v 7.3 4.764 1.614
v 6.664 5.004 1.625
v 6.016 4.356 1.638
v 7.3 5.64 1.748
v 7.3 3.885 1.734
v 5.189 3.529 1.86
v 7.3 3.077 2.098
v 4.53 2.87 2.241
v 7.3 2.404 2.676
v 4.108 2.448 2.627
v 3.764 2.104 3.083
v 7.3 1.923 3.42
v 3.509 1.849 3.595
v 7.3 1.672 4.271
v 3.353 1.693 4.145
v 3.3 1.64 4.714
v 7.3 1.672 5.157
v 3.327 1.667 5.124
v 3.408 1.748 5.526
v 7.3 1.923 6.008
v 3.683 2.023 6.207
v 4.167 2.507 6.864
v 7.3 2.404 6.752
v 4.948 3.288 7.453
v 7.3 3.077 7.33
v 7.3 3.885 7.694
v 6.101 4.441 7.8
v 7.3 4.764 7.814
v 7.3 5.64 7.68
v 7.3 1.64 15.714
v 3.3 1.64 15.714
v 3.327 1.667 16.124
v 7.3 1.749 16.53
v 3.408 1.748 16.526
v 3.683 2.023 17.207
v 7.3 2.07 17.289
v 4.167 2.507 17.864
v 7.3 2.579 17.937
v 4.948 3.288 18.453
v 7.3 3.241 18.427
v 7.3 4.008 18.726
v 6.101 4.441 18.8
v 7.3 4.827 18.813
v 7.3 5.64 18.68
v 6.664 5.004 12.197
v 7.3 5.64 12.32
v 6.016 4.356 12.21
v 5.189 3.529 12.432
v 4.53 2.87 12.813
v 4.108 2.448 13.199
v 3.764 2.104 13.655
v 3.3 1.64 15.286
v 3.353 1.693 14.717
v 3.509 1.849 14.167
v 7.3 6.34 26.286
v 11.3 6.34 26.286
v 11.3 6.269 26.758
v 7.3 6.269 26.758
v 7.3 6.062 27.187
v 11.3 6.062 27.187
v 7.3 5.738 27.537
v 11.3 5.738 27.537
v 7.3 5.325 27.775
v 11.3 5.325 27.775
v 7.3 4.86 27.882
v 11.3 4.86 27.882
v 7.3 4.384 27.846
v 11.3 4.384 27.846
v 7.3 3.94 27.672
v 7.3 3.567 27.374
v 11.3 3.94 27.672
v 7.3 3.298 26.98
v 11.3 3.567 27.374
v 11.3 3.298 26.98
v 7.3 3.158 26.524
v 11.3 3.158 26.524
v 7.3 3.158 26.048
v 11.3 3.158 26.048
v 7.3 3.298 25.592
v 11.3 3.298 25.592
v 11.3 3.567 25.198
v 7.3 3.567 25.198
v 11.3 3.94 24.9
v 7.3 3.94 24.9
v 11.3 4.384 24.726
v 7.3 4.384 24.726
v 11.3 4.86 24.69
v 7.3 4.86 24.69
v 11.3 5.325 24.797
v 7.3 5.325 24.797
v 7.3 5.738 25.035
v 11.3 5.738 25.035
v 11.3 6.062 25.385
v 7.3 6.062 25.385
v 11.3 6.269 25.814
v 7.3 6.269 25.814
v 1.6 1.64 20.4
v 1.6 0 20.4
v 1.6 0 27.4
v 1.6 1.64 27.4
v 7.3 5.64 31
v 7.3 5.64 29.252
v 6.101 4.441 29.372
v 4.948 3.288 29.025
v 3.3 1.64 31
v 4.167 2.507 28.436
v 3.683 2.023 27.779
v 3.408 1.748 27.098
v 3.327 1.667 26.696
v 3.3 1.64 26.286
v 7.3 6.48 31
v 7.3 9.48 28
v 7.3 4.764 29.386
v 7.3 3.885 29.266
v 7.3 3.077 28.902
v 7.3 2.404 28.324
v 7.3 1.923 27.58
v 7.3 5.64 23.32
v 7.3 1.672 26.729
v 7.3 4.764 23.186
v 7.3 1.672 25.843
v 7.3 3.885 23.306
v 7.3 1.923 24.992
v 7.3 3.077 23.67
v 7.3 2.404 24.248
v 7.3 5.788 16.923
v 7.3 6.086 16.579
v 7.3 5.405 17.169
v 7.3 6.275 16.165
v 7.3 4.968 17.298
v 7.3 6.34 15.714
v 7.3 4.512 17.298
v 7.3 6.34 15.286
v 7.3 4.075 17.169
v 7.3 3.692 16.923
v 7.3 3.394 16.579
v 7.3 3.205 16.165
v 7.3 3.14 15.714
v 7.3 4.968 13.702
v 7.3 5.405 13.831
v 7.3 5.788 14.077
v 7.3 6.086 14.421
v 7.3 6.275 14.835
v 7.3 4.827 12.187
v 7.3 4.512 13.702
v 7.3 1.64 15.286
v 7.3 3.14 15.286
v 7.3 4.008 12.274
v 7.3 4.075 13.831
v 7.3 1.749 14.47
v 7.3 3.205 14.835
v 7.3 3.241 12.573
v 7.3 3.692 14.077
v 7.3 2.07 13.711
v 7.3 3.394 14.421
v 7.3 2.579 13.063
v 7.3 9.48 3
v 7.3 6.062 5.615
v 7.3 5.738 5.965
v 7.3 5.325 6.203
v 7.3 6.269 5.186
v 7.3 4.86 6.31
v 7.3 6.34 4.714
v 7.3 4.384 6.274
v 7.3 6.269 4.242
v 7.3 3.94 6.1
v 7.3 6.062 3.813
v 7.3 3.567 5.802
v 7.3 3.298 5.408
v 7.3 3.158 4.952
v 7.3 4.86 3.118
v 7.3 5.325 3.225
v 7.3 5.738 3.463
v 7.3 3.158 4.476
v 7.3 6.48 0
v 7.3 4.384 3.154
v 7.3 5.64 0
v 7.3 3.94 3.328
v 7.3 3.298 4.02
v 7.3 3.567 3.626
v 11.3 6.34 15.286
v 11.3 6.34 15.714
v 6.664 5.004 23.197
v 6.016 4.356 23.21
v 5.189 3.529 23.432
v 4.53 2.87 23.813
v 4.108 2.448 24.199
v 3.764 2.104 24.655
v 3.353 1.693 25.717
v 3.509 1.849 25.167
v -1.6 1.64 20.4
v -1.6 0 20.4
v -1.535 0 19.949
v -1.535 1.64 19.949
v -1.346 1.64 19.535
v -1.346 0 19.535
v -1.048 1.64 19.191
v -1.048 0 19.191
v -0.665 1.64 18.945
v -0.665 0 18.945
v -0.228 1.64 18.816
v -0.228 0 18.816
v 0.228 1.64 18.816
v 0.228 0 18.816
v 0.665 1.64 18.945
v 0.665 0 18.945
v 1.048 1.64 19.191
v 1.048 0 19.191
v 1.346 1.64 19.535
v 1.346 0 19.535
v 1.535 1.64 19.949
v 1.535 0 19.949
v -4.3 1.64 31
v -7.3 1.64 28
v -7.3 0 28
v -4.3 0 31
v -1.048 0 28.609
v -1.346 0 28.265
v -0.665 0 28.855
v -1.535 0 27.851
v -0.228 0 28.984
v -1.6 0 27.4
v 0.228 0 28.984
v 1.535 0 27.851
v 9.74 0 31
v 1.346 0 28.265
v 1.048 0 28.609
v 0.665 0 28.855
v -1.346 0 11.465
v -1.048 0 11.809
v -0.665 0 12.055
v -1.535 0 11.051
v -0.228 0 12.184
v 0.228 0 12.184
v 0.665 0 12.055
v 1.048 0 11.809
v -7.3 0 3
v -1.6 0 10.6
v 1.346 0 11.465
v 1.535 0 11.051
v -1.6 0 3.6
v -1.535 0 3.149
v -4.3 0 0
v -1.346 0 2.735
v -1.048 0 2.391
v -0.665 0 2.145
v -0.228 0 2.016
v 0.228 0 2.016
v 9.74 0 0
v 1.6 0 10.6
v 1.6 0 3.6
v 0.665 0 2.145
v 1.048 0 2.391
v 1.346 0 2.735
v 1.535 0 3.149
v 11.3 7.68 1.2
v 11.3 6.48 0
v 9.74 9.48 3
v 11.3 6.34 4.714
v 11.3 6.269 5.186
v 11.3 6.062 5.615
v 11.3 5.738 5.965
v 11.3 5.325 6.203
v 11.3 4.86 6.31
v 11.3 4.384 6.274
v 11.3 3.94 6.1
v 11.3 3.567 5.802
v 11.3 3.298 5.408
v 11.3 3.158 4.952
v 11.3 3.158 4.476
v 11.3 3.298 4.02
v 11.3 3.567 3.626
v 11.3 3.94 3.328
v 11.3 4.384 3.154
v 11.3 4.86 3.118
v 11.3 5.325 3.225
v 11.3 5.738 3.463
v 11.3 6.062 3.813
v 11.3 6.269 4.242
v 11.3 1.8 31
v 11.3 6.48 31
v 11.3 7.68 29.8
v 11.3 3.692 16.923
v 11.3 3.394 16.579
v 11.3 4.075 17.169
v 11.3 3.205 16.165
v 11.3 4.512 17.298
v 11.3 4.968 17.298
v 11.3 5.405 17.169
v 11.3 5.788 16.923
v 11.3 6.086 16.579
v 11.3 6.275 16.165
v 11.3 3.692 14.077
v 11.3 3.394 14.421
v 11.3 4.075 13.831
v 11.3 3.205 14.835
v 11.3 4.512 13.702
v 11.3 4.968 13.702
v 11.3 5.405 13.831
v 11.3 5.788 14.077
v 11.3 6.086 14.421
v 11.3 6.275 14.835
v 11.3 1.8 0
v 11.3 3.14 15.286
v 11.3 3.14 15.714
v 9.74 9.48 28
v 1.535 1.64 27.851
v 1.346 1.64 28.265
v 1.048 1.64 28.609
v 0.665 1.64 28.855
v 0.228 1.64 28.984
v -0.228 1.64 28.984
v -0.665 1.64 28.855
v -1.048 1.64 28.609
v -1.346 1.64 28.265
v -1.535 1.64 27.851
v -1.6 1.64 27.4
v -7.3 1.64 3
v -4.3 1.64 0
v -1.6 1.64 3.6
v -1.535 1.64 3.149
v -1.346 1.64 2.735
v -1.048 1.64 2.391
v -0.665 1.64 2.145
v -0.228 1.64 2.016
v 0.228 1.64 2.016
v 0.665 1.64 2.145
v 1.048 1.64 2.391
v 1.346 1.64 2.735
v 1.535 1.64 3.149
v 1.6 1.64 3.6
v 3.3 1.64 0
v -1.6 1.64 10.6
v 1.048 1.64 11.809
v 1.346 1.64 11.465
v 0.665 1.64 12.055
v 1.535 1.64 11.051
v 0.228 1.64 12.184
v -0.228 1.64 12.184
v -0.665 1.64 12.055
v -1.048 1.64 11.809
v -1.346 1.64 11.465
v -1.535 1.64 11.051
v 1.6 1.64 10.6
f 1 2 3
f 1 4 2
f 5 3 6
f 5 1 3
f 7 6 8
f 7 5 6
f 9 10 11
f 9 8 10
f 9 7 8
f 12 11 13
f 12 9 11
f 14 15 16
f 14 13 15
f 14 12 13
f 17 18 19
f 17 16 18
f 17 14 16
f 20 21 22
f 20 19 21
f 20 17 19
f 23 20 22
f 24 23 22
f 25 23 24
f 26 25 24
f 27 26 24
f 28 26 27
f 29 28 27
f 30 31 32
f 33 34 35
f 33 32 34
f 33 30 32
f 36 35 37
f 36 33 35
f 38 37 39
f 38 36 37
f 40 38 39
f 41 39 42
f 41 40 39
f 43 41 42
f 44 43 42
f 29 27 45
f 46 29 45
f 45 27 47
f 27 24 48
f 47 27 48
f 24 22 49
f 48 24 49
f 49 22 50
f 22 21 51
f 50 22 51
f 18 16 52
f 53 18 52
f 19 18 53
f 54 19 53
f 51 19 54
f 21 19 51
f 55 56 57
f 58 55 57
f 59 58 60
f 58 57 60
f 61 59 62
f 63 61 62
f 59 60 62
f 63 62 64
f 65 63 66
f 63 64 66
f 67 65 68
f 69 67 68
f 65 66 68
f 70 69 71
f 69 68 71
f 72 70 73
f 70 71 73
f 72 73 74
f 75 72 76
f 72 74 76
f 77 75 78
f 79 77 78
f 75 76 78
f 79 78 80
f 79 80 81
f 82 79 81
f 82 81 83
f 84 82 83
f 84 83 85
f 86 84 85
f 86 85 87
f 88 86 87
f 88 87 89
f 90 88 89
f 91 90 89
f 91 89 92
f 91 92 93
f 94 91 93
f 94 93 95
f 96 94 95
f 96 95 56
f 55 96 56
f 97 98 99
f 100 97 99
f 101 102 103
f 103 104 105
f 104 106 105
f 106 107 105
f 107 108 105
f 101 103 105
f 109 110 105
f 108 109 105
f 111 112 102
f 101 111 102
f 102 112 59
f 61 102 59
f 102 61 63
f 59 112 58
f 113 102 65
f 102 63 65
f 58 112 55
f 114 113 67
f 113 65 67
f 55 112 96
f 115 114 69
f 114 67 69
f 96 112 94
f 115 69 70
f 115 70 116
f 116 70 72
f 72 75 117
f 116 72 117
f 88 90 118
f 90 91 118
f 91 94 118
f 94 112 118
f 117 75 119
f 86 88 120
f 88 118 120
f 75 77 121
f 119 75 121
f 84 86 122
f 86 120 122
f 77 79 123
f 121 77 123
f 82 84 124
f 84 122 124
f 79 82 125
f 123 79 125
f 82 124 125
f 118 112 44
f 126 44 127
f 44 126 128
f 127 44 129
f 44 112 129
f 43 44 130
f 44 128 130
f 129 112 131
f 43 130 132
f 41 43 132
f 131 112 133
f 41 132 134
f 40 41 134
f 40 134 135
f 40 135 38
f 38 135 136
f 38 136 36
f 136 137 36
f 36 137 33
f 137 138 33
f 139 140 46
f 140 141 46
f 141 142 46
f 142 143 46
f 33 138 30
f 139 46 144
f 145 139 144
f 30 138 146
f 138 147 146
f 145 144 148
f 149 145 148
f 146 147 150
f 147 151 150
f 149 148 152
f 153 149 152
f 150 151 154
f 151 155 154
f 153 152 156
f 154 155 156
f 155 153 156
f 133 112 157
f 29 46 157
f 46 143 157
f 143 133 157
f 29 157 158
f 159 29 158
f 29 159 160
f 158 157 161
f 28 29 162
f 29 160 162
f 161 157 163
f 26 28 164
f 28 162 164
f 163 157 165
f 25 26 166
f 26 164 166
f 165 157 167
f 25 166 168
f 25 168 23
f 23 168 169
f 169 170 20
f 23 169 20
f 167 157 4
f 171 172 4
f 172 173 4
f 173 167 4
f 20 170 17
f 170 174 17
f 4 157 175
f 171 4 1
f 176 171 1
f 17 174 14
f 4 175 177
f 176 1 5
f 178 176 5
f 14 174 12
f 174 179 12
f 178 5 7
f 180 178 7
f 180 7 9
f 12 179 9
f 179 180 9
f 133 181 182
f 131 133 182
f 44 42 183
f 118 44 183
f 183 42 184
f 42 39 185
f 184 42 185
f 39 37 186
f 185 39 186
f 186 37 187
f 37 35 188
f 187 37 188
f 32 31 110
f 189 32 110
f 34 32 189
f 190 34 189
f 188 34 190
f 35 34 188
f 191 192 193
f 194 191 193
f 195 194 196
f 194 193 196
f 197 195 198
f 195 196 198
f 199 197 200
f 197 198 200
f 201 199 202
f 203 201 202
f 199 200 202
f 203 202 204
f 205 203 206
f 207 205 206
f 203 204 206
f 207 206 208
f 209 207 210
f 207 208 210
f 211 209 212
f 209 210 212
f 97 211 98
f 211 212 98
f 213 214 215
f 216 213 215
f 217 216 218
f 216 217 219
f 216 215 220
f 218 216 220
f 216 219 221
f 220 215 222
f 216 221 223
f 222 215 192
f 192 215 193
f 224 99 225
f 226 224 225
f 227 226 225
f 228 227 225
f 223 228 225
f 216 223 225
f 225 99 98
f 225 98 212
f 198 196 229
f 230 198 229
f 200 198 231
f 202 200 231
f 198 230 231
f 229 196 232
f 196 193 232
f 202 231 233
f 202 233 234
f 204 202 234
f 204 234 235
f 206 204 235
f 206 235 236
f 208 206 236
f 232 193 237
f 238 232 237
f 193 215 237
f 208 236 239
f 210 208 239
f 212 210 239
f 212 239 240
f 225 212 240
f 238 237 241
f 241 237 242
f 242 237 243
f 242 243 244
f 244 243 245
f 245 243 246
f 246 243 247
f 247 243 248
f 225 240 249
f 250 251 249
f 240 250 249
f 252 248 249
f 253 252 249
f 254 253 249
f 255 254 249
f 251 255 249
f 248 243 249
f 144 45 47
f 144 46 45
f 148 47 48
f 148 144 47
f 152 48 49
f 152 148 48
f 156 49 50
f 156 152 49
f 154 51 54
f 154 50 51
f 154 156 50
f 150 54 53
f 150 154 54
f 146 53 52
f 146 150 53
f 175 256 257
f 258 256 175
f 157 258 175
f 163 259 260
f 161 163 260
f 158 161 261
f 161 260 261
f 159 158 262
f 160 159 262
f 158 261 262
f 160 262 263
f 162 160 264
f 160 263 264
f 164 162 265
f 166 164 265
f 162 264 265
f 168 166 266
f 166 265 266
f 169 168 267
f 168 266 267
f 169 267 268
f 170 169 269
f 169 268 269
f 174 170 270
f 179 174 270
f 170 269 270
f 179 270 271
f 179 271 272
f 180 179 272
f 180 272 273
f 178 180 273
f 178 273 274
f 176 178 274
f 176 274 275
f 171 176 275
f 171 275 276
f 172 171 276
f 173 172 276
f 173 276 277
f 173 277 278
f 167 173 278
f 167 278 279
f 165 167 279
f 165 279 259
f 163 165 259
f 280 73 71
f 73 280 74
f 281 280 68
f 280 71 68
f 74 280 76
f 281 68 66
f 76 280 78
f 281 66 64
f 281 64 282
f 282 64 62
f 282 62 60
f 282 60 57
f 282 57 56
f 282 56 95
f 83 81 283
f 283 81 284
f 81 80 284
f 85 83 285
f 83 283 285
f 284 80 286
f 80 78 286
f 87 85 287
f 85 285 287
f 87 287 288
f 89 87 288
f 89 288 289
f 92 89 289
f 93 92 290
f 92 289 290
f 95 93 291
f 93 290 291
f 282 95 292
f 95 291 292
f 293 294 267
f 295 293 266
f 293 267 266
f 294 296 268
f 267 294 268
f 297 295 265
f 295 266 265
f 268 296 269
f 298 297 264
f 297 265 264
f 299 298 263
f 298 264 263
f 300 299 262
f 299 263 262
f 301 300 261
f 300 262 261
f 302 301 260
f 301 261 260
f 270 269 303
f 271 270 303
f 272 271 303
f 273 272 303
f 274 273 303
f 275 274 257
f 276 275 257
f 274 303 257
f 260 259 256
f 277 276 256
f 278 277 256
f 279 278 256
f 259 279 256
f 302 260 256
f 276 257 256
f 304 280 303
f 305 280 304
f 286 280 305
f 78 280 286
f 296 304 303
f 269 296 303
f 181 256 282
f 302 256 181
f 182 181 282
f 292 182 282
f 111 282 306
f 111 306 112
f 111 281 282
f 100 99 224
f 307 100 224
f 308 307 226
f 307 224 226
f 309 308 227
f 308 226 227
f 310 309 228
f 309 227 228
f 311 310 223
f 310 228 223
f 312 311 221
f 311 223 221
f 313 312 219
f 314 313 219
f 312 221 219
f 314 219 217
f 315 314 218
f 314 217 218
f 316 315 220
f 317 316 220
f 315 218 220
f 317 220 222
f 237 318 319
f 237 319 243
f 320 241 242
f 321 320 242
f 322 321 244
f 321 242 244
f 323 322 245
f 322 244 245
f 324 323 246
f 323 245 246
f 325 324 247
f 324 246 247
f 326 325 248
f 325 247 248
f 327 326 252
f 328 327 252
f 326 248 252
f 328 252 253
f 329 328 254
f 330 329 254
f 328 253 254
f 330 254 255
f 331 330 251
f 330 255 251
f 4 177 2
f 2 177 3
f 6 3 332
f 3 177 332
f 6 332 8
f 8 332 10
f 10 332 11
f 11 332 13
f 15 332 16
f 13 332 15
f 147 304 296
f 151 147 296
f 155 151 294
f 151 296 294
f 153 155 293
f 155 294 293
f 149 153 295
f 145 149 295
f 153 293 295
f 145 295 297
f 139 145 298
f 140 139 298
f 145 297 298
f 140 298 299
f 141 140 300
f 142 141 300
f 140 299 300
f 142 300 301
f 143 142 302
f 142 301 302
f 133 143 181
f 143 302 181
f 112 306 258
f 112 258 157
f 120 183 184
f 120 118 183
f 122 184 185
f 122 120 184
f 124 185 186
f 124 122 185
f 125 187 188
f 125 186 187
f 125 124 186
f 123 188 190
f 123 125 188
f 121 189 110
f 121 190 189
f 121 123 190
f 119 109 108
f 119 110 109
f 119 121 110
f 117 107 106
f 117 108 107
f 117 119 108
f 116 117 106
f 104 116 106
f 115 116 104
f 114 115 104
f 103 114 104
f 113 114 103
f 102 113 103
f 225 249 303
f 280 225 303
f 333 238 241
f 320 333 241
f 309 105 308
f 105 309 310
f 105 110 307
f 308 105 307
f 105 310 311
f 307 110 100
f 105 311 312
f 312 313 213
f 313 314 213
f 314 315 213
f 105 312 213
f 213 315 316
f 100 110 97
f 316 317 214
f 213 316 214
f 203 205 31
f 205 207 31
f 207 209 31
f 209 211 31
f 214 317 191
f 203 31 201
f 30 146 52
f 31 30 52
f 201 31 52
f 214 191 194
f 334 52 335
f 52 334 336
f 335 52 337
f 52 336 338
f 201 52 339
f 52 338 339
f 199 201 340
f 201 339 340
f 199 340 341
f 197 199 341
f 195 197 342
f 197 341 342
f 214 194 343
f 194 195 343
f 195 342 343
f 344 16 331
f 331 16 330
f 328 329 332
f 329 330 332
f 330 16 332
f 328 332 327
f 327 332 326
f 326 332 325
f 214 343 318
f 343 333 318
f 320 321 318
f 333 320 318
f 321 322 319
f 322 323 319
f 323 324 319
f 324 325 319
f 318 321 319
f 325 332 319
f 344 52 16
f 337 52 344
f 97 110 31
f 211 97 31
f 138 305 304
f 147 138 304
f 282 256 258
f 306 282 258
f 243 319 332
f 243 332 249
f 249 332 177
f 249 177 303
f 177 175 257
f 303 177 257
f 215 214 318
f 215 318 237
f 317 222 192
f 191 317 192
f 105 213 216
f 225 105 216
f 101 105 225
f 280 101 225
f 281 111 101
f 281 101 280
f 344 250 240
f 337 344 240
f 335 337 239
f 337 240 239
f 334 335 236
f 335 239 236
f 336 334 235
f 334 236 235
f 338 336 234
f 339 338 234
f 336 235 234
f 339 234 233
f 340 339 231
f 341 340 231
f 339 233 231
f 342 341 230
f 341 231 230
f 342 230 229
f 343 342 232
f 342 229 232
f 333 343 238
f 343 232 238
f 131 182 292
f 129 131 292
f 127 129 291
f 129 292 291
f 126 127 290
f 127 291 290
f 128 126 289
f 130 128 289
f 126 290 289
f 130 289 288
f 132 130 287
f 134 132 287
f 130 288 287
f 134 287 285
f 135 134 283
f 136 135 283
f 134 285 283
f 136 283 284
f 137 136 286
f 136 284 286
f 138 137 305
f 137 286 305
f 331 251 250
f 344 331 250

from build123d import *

# Parameters (mm, degrees)
PAD_DEPTH       = 31
CHAMFER_SIZE    = 4
SKETCH001_R     = 1.6
POCKET_DEPTH    = 18.6
SKETCH002_R     = 3.1
POCKET001_DEPTH = 14.6
POCKET002_DEPTH = 9.48
CHAMFER001_SIZE = 3


with BuildPart() as part:
    # Sketch → Pad (new body)
    with BuildSketch(Plane.XY):
        Polygon((-7.3, 1.64), (-7.3, 0), (9.74, 0), (11.3, 1.8), (11.3, 7.68), (9.74, 9.48), (7.3, 9.48), (7.3, 1.64), align=None)
    extrude(amount=PAD_DEPTH)

    # Chamfer
    chamfer_edges = [part.edges().sort_by_distance(p)[0] for p in [
        (7.3, 1.64, 15.5),
    ]]
    chamfer(chamfer_edges, length=CHAMFER_SIZE)

    # Sketch001 (on Face9 of Chamfer) → Pocket (cut)
    with BuildSketch(Plane.YZ.offset(11.3)):
        with Locations((4.74, 26.286)):
            Circle(SKETCH001_R)
        with Locations((4.74, 4.714)):
            Circle(SKETCH001_R)
        with BuildLine():
            ThreePointArc((6.34, 15.714), (4.74, 17.314), (3.14, 15.714))
            Line((3.14, 15.714), (3.14, 15.286))
            ThreePointArc((3.14, 15.286), (4.74, 13.686), (6.34, 15.286))
            Line((6.34, 15.286), (6.34, 15.714))
        make_face()
    extrude(amount=-POCKET_DEPTH, mode=Mode.SUBTRACT)

    # Sketch002 (on Face1 of Pocket) → Pocket001 (cut)
    with BuildSketch(Plane(origin=(7.3, 0, 0), x_dir=(0, -1, 0), z_dir=(-1, 0, 0))):
        with Locations((-4.74, 26.286)):
            Circle(SKETCH002_R)
        with Locations((-4.74, 4.714)):
            Circle(SKETCH002_R)
        with BuildLine():
            ThreePointArc((-1.64, 15.714), (-4.74, 18.814), (-7.84, 15.714))
            Line((-7.84, 15.714), (-7.84, 15.286))
            ThreePointArc((-7.84, 15.286), (-4.74, 12.186), (-1.64, 15.286))
            Line((-1.64, 15.286), (-1.64, 15.714))
        make_face()
    extrude(amount=POCKET001_DEPTH, mode=Mode.SUBTRACT)

    # Sketch003 (on Face33 of Pocket001) → Pocket002 (cut)
    with BuildSketch(Plane.XZ):
        with BuildLine():
            ThreePointArc((1.6, 27.4), (0, 29), (-1.6, 27.4))
            Line((-1.6, 27.4), (-1.6, 20.4))
            ThreePointArc((-1.6, 20.4), (0, 18.8), (1.6, 20.4))
            Line((1.6, 20.4), (1.6, 27.4))
        make_face()
        with BuildLine():
            ThreePointArc((1.6, 10.6), (0, 12.2), (-1.6, 10.6))
            Line((-1.6, 10.6), (-1.6, 3.6))
            ThreePointArc((-1.6, 3.6), (0, 2), (1.6, 3.6))
            Line((1.6, 3.6), (1.6, 10.6))
        make_face()
    extrude(amount=-POCKET002_DEPTH, mode=Mode.SUBTRACT)

    # Chamfer001
    chamfer001_edges = [part.edges().sort_by_distance(p)[0] for p in [
        (8.52, 9.48, 31),
        (8.52, 9.48, 0),
        (-7.3, 0.82, 0),
        (-7.3, 0.82, 31),
    ]]
    chamfer(chamfer001_edges, length=CHAMFER001_SIZE)


solid = part.part
